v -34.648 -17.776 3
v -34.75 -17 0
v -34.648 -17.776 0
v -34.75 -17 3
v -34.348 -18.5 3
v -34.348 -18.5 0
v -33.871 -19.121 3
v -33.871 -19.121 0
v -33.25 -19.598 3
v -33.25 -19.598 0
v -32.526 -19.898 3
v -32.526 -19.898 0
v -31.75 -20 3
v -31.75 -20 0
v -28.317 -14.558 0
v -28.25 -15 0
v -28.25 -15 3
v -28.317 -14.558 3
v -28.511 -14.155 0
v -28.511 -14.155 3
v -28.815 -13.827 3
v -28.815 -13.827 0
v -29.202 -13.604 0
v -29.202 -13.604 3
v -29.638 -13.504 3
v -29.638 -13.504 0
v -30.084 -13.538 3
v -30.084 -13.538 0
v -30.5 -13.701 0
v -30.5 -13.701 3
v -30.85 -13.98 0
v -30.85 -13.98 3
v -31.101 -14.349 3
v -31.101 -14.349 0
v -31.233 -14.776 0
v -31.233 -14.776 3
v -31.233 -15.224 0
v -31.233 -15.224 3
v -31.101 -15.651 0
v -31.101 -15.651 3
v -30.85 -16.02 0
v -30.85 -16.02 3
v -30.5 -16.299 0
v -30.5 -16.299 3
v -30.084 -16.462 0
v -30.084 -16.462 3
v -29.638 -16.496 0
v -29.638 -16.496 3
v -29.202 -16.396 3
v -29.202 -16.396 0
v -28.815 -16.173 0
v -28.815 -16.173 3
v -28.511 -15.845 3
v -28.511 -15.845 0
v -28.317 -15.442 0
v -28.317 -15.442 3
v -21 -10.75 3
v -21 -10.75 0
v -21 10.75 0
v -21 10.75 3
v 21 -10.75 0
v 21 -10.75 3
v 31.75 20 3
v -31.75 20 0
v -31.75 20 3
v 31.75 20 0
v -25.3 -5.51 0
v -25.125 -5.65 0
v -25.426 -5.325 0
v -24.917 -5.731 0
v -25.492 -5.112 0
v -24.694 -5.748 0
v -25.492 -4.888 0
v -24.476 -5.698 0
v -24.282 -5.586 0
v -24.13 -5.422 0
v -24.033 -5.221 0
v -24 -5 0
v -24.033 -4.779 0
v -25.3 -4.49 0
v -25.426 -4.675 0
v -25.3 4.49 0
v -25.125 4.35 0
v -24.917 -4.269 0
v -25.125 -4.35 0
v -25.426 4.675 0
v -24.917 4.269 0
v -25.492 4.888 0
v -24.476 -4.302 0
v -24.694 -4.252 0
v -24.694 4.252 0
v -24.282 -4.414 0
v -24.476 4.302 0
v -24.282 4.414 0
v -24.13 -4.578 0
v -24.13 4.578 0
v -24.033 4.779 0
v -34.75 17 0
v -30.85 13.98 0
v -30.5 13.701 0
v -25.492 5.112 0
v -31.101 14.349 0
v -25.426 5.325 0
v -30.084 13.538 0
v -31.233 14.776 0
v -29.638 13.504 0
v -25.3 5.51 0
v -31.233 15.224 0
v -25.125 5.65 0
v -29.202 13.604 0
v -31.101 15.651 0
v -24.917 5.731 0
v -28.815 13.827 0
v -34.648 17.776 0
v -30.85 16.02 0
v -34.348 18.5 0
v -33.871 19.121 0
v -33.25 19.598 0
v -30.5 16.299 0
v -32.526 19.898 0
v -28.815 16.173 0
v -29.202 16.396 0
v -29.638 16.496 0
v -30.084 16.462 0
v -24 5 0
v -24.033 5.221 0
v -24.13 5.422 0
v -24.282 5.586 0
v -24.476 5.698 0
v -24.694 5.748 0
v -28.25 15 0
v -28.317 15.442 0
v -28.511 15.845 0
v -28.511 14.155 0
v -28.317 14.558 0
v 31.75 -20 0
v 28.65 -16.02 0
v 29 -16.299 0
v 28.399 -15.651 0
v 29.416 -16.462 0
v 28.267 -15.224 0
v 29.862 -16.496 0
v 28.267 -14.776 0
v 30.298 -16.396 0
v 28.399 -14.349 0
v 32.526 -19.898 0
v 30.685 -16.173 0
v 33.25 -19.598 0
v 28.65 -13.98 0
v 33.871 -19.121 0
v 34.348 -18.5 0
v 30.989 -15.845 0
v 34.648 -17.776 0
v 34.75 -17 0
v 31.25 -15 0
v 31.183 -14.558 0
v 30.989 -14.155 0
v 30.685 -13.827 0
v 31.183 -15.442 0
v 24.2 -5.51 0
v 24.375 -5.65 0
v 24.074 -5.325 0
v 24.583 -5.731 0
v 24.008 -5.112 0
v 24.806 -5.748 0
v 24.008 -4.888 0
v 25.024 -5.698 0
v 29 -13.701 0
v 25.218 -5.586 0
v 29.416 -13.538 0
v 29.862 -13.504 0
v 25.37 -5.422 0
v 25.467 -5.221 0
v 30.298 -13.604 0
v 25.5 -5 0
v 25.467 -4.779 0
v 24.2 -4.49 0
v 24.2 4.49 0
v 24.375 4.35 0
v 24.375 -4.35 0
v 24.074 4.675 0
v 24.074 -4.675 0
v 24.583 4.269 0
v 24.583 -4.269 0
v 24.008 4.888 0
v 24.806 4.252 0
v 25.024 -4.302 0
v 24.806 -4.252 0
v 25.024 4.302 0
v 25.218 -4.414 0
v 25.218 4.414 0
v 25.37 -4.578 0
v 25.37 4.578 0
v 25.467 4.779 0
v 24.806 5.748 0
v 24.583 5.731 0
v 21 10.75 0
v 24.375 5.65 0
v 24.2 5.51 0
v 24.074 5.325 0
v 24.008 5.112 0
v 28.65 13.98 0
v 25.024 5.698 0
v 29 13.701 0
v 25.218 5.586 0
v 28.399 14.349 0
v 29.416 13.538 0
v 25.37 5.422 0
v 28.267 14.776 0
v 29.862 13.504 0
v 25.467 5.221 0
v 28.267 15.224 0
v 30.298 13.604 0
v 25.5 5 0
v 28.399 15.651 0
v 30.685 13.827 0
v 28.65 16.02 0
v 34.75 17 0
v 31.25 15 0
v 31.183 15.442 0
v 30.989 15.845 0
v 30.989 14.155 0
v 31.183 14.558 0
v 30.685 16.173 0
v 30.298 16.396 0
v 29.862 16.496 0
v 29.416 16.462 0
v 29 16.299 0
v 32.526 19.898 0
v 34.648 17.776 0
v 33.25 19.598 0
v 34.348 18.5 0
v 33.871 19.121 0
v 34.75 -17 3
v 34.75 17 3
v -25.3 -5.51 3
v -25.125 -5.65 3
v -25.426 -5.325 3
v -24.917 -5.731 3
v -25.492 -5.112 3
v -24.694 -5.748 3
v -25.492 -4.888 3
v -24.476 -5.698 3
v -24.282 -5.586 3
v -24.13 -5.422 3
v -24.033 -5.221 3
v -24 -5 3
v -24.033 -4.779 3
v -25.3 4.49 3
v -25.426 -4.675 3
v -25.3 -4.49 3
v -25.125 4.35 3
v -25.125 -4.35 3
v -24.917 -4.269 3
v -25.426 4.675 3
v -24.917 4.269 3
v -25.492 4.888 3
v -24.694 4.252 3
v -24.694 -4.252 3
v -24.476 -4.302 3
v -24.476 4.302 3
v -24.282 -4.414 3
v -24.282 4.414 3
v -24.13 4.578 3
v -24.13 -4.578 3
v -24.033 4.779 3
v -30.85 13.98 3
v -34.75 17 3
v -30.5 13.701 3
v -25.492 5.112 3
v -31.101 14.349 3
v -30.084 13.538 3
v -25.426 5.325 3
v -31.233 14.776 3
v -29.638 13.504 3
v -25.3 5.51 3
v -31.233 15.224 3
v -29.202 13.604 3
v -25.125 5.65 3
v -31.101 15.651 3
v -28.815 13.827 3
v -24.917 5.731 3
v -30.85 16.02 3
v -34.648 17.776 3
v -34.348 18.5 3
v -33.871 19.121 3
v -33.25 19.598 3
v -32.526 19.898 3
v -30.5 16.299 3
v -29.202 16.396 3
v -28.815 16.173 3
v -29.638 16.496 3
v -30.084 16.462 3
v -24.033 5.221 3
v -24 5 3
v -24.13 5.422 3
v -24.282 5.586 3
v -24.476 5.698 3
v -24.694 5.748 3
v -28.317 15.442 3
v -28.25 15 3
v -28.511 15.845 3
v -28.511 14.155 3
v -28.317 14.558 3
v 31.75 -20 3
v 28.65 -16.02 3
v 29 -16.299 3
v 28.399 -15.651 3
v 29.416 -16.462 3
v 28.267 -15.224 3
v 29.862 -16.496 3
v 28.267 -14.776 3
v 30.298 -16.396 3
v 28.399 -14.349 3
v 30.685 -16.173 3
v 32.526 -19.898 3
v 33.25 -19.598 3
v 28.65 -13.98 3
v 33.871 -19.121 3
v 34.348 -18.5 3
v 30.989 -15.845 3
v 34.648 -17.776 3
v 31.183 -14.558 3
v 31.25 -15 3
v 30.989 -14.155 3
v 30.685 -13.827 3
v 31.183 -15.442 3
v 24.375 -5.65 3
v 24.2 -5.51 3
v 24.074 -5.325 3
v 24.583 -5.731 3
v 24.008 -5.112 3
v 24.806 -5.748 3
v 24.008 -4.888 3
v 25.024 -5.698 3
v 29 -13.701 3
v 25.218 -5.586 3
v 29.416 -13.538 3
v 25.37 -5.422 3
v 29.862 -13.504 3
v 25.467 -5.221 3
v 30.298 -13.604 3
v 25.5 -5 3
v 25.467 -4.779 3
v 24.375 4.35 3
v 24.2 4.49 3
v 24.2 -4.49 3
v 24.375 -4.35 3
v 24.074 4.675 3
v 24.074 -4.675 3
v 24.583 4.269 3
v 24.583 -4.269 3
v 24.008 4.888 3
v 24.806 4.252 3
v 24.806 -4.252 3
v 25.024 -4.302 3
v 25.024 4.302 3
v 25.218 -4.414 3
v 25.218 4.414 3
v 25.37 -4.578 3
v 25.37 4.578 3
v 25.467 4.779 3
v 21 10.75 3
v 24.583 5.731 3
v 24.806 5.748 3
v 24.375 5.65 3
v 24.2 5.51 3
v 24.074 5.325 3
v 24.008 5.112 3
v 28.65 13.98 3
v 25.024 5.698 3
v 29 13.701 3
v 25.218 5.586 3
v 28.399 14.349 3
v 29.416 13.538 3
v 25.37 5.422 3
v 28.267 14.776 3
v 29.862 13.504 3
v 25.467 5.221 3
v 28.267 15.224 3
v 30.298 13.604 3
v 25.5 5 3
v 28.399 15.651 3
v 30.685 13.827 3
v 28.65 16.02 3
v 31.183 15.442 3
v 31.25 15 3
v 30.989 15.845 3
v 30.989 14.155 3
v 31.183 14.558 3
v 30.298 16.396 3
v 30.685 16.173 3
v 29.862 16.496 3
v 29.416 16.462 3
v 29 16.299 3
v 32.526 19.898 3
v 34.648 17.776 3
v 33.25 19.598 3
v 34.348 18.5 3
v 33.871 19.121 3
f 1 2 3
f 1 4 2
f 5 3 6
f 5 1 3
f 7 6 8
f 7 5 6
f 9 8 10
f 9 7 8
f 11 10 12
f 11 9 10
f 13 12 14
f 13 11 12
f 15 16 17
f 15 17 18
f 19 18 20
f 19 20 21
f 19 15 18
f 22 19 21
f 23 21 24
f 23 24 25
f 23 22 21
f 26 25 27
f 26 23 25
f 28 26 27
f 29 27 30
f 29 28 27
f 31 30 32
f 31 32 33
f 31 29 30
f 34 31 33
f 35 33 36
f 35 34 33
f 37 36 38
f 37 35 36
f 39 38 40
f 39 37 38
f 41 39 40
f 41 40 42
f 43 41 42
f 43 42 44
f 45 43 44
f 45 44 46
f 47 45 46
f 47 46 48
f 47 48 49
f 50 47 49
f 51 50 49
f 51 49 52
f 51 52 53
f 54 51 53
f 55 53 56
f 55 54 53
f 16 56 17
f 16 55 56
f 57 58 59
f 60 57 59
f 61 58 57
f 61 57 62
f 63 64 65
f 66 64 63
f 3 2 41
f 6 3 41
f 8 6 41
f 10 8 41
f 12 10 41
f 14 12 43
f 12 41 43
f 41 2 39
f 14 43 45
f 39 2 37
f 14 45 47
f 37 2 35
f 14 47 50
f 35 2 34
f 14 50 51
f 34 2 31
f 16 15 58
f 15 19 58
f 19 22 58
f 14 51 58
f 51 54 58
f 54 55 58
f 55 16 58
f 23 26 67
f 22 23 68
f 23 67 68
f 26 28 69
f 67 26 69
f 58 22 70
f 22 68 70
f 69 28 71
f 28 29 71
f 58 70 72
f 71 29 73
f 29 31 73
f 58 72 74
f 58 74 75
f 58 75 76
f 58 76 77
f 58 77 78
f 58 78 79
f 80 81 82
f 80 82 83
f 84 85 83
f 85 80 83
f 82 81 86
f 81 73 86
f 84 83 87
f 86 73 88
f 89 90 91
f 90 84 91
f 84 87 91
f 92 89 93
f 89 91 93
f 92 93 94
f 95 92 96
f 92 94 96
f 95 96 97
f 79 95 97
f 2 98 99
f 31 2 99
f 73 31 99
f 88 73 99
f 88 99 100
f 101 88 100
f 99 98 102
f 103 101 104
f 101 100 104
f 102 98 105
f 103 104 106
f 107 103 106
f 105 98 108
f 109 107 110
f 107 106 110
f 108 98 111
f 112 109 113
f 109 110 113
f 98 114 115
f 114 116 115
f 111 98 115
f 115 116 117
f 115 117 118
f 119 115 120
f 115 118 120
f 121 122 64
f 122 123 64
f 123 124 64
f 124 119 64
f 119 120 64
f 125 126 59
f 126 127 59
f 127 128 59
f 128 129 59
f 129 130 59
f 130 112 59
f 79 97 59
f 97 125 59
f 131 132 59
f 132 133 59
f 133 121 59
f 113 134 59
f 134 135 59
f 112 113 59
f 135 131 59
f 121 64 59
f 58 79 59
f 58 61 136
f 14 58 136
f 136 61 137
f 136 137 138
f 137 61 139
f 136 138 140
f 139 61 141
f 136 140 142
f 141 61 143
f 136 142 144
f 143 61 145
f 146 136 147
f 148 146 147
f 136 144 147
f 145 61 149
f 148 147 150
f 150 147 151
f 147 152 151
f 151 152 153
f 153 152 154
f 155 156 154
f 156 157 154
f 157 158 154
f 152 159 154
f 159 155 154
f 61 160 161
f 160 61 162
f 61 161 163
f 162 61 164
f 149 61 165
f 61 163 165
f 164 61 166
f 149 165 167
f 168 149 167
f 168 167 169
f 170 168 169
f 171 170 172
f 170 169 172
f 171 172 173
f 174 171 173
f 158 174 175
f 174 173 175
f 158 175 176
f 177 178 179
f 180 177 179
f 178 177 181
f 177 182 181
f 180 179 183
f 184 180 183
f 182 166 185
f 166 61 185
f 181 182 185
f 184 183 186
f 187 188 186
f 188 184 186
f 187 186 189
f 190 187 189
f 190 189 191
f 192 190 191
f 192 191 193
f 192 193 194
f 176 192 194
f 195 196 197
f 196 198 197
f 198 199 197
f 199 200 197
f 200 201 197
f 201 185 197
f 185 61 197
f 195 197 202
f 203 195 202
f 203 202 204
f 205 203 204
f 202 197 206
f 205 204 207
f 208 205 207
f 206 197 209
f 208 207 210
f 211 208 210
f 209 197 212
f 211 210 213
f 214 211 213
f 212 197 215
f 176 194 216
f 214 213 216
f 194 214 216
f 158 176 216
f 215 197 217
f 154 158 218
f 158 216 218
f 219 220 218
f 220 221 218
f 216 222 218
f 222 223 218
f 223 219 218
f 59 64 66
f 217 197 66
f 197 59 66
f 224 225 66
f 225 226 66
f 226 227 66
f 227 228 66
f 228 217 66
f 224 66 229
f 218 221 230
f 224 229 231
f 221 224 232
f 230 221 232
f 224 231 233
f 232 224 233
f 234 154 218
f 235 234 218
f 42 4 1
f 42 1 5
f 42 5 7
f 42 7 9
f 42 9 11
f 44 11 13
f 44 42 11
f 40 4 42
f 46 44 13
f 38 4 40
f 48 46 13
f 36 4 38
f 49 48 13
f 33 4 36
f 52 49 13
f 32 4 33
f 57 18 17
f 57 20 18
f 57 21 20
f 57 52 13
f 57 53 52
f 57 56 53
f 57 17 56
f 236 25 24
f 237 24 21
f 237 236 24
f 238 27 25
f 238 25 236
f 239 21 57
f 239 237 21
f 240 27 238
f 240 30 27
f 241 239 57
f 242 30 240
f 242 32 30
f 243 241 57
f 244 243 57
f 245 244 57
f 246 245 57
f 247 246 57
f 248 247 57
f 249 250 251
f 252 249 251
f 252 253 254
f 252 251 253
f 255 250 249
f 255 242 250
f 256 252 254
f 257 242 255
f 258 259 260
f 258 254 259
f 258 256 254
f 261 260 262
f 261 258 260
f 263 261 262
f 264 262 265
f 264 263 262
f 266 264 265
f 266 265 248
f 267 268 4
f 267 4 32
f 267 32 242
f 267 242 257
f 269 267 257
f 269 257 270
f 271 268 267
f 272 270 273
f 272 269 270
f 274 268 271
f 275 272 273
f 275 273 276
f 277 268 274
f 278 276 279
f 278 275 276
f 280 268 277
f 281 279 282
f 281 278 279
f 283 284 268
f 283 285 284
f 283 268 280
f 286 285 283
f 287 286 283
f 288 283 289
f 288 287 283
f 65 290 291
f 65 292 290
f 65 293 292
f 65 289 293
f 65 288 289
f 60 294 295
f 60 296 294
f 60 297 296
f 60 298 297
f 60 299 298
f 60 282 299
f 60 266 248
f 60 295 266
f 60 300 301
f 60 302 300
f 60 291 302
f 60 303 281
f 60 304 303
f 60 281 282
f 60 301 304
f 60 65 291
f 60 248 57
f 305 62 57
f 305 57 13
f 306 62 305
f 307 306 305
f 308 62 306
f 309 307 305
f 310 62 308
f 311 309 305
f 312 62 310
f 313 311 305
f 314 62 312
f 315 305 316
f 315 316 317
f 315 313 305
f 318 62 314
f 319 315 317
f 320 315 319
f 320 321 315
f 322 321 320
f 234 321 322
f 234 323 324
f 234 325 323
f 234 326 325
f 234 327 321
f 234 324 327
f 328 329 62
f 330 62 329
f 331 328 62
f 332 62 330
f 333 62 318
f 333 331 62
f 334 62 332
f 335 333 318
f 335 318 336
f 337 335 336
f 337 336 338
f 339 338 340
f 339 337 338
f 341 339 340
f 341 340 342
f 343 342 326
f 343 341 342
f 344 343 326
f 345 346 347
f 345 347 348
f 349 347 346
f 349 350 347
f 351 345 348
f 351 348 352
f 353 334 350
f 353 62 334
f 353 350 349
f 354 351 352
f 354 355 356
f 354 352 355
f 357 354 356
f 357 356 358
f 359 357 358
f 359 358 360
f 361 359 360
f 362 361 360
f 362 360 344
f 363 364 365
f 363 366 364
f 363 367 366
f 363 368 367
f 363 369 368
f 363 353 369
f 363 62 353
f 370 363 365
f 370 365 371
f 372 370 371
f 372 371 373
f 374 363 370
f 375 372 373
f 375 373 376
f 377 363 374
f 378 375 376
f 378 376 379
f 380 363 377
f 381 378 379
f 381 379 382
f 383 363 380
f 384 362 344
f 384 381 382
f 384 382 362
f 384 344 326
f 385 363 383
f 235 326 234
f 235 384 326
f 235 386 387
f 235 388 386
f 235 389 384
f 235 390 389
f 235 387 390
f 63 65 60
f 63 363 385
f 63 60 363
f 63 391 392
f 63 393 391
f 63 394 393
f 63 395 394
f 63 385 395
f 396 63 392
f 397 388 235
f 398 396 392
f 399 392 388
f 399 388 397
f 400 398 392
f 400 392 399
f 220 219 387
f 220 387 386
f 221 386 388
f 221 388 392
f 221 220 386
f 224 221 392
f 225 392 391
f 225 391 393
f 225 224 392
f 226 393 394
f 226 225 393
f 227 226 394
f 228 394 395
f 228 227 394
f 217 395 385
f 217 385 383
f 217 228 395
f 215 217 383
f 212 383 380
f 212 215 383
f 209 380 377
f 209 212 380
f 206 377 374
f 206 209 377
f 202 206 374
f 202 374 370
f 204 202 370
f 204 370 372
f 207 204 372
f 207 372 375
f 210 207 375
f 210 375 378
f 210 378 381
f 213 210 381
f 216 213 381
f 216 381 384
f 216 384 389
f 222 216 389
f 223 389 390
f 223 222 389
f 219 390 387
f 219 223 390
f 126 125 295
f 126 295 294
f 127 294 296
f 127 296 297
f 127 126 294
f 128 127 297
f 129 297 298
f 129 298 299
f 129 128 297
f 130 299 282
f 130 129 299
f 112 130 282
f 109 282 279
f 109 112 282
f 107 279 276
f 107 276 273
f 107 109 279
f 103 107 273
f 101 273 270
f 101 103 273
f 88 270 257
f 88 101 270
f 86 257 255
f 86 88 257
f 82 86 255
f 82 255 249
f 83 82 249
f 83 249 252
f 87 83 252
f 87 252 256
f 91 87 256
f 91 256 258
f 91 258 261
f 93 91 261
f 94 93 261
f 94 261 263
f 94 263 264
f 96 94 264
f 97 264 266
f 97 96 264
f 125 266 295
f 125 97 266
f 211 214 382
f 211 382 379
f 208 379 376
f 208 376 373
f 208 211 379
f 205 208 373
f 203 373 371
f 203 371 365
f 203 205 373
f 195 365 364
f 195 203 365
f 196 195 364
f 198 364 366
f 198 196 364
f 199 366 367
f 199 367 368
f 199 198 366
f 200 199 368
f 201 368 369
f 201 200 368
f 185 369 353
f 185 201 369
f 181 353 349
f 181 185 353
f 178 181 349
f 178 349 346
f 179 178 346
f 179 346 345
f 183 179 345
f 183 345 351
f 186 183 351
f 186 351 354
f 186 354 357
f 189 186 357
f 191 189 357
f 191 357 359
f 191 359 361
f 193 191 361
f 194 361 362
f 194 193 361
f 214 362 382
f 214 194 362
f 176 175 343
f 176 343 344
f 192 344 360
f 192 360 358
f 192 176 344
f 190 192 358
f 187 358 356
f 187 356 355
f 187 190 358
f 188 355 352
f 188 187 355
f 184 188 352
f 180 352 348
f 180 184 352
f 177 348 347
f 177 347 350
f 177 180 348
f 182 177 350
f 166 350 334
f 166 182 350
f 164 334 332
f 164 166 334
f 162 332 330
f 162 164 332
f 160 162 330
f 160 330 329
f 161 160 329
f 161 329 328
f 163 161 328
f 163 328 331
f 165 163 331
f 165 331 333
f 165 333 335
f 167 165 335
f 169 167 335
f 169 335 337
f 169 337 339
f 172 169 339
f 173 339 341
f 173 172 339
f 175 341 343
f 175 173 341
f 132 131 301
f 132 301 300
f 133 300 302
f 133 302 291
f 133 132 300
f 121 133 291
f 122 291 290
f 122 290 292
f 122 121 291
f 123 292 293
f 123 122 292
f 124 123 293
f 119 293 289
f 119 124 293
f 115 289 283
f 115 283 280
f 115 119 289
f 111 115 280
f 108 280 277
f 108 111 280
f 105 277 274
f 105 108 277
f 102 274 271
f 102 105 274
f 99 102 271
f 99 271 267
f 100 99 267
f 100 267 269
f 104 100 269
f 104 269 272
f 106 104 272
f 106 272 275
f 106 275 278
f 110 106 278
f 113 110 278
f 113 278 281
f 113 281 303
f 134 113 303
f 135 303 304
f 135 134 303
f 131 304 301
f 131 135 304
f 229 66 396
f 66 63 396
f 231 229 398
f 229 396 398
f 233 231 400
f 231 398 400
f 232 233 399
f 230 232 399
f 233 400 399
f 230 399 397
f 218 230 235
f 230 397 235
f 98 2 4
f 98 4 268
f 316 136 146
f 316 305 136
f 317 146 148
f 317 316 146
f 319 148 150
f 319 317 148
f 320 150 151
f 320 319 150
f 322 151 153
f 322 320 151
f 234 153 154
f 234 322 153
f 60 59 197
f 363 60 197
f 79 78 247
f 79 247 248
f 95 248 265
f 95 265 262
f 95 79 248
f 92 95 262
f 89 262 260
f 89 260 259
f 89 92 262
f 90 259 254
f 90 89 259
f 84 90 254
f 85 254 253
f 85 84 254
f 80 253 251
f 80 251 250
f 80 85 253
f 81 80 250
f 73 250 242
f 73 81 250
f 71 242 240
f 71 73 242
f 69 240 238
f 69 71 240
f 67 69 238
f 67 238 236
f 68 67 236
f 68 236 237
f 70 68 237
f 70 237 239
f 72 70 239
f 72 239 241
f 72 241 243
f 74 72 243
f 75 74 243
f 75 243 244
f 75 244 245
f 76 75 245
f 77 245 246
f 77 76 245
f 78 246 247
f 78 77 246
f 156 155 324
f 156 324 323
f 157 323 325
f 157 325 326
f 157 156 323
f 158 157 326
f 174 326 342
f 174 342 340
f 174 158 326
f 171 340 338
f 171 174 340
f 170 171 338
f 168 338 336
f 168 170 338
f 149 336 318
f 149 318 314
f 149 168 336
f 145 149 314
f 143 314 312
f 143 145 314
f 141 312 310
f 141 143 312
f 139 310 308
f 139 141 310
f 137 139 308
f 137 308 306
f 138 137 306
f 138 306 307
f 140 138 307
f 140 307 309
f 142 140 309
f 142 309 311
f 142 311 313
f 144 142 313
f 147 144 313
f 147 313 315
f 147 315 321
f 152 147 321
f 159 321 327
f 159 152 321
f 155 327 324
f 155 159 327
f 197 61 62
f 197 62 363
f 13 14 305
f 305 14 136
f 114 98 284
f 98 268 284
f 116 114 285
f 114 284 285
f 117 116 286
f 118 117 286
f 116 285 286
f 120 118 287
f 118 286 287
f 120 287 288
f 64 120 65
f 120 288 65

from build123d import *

# Parameters (mm, degrees)
F0_W     = 69.5
F0_H     = 40
F0_R     = 1.5
F0_R_2   = 0.75
F0_W_2   = 42
F0_H_2   = 21.5
F1_DEPTH = 3
F2_R     = 3


with BuildPart() as f1:
    # F0 (on Top) → F1 (new body)
    with BuildSketch(Plane.XY):
        Rectangle(F0_W, F0_H)
        with Locations((-29.75, -15)):
            Circle(F0_R, mode=Mode.SUBTRACT)
        with Locations((-24.75, -5)):
            Circle(F0_R_2, mode=Mode.SUBTRACT)
        with Locations((29.75, -15)):
            Circle(F0_R, mode=Mode.SUBTRACT)
        with Locations((24.75, -5)):
            Circle(F0_R_2, mode=Mode.SUBTRACT)
        with Locations((-24.75, 5)):
            Circle(F0_R_2, mode=Mode.SUBTRACT)
        with Locations((-29.75, 15)):
            Circle(F0_R, mode=Mode.SUBTRACT)
        Rectangle(F0_W_2, F0_H_2, mode=Mode.SUBTRACT)
        with Locations((24.75, 5)):
            Circle(F0_R_2, mode=Mode.SUBTRACT)
        with Locations((29.75, 15)):
            Circle(F0_R, mode=Mode.SUBTRACT)
    extrude(amount=F1_DEPTH)

    # F2
    f2_edges = [f1.edges().sort_by_distance(p)[0] for p in [
        (-34.75, -20, 1.5),
        (34.75, -20, 1.5),
        (34.75, 20, 1.5),
        (-34.75, 20, 1.5),
    ]]
    fillet(f2_edges, radius=F2_R)


solid = f1.part
